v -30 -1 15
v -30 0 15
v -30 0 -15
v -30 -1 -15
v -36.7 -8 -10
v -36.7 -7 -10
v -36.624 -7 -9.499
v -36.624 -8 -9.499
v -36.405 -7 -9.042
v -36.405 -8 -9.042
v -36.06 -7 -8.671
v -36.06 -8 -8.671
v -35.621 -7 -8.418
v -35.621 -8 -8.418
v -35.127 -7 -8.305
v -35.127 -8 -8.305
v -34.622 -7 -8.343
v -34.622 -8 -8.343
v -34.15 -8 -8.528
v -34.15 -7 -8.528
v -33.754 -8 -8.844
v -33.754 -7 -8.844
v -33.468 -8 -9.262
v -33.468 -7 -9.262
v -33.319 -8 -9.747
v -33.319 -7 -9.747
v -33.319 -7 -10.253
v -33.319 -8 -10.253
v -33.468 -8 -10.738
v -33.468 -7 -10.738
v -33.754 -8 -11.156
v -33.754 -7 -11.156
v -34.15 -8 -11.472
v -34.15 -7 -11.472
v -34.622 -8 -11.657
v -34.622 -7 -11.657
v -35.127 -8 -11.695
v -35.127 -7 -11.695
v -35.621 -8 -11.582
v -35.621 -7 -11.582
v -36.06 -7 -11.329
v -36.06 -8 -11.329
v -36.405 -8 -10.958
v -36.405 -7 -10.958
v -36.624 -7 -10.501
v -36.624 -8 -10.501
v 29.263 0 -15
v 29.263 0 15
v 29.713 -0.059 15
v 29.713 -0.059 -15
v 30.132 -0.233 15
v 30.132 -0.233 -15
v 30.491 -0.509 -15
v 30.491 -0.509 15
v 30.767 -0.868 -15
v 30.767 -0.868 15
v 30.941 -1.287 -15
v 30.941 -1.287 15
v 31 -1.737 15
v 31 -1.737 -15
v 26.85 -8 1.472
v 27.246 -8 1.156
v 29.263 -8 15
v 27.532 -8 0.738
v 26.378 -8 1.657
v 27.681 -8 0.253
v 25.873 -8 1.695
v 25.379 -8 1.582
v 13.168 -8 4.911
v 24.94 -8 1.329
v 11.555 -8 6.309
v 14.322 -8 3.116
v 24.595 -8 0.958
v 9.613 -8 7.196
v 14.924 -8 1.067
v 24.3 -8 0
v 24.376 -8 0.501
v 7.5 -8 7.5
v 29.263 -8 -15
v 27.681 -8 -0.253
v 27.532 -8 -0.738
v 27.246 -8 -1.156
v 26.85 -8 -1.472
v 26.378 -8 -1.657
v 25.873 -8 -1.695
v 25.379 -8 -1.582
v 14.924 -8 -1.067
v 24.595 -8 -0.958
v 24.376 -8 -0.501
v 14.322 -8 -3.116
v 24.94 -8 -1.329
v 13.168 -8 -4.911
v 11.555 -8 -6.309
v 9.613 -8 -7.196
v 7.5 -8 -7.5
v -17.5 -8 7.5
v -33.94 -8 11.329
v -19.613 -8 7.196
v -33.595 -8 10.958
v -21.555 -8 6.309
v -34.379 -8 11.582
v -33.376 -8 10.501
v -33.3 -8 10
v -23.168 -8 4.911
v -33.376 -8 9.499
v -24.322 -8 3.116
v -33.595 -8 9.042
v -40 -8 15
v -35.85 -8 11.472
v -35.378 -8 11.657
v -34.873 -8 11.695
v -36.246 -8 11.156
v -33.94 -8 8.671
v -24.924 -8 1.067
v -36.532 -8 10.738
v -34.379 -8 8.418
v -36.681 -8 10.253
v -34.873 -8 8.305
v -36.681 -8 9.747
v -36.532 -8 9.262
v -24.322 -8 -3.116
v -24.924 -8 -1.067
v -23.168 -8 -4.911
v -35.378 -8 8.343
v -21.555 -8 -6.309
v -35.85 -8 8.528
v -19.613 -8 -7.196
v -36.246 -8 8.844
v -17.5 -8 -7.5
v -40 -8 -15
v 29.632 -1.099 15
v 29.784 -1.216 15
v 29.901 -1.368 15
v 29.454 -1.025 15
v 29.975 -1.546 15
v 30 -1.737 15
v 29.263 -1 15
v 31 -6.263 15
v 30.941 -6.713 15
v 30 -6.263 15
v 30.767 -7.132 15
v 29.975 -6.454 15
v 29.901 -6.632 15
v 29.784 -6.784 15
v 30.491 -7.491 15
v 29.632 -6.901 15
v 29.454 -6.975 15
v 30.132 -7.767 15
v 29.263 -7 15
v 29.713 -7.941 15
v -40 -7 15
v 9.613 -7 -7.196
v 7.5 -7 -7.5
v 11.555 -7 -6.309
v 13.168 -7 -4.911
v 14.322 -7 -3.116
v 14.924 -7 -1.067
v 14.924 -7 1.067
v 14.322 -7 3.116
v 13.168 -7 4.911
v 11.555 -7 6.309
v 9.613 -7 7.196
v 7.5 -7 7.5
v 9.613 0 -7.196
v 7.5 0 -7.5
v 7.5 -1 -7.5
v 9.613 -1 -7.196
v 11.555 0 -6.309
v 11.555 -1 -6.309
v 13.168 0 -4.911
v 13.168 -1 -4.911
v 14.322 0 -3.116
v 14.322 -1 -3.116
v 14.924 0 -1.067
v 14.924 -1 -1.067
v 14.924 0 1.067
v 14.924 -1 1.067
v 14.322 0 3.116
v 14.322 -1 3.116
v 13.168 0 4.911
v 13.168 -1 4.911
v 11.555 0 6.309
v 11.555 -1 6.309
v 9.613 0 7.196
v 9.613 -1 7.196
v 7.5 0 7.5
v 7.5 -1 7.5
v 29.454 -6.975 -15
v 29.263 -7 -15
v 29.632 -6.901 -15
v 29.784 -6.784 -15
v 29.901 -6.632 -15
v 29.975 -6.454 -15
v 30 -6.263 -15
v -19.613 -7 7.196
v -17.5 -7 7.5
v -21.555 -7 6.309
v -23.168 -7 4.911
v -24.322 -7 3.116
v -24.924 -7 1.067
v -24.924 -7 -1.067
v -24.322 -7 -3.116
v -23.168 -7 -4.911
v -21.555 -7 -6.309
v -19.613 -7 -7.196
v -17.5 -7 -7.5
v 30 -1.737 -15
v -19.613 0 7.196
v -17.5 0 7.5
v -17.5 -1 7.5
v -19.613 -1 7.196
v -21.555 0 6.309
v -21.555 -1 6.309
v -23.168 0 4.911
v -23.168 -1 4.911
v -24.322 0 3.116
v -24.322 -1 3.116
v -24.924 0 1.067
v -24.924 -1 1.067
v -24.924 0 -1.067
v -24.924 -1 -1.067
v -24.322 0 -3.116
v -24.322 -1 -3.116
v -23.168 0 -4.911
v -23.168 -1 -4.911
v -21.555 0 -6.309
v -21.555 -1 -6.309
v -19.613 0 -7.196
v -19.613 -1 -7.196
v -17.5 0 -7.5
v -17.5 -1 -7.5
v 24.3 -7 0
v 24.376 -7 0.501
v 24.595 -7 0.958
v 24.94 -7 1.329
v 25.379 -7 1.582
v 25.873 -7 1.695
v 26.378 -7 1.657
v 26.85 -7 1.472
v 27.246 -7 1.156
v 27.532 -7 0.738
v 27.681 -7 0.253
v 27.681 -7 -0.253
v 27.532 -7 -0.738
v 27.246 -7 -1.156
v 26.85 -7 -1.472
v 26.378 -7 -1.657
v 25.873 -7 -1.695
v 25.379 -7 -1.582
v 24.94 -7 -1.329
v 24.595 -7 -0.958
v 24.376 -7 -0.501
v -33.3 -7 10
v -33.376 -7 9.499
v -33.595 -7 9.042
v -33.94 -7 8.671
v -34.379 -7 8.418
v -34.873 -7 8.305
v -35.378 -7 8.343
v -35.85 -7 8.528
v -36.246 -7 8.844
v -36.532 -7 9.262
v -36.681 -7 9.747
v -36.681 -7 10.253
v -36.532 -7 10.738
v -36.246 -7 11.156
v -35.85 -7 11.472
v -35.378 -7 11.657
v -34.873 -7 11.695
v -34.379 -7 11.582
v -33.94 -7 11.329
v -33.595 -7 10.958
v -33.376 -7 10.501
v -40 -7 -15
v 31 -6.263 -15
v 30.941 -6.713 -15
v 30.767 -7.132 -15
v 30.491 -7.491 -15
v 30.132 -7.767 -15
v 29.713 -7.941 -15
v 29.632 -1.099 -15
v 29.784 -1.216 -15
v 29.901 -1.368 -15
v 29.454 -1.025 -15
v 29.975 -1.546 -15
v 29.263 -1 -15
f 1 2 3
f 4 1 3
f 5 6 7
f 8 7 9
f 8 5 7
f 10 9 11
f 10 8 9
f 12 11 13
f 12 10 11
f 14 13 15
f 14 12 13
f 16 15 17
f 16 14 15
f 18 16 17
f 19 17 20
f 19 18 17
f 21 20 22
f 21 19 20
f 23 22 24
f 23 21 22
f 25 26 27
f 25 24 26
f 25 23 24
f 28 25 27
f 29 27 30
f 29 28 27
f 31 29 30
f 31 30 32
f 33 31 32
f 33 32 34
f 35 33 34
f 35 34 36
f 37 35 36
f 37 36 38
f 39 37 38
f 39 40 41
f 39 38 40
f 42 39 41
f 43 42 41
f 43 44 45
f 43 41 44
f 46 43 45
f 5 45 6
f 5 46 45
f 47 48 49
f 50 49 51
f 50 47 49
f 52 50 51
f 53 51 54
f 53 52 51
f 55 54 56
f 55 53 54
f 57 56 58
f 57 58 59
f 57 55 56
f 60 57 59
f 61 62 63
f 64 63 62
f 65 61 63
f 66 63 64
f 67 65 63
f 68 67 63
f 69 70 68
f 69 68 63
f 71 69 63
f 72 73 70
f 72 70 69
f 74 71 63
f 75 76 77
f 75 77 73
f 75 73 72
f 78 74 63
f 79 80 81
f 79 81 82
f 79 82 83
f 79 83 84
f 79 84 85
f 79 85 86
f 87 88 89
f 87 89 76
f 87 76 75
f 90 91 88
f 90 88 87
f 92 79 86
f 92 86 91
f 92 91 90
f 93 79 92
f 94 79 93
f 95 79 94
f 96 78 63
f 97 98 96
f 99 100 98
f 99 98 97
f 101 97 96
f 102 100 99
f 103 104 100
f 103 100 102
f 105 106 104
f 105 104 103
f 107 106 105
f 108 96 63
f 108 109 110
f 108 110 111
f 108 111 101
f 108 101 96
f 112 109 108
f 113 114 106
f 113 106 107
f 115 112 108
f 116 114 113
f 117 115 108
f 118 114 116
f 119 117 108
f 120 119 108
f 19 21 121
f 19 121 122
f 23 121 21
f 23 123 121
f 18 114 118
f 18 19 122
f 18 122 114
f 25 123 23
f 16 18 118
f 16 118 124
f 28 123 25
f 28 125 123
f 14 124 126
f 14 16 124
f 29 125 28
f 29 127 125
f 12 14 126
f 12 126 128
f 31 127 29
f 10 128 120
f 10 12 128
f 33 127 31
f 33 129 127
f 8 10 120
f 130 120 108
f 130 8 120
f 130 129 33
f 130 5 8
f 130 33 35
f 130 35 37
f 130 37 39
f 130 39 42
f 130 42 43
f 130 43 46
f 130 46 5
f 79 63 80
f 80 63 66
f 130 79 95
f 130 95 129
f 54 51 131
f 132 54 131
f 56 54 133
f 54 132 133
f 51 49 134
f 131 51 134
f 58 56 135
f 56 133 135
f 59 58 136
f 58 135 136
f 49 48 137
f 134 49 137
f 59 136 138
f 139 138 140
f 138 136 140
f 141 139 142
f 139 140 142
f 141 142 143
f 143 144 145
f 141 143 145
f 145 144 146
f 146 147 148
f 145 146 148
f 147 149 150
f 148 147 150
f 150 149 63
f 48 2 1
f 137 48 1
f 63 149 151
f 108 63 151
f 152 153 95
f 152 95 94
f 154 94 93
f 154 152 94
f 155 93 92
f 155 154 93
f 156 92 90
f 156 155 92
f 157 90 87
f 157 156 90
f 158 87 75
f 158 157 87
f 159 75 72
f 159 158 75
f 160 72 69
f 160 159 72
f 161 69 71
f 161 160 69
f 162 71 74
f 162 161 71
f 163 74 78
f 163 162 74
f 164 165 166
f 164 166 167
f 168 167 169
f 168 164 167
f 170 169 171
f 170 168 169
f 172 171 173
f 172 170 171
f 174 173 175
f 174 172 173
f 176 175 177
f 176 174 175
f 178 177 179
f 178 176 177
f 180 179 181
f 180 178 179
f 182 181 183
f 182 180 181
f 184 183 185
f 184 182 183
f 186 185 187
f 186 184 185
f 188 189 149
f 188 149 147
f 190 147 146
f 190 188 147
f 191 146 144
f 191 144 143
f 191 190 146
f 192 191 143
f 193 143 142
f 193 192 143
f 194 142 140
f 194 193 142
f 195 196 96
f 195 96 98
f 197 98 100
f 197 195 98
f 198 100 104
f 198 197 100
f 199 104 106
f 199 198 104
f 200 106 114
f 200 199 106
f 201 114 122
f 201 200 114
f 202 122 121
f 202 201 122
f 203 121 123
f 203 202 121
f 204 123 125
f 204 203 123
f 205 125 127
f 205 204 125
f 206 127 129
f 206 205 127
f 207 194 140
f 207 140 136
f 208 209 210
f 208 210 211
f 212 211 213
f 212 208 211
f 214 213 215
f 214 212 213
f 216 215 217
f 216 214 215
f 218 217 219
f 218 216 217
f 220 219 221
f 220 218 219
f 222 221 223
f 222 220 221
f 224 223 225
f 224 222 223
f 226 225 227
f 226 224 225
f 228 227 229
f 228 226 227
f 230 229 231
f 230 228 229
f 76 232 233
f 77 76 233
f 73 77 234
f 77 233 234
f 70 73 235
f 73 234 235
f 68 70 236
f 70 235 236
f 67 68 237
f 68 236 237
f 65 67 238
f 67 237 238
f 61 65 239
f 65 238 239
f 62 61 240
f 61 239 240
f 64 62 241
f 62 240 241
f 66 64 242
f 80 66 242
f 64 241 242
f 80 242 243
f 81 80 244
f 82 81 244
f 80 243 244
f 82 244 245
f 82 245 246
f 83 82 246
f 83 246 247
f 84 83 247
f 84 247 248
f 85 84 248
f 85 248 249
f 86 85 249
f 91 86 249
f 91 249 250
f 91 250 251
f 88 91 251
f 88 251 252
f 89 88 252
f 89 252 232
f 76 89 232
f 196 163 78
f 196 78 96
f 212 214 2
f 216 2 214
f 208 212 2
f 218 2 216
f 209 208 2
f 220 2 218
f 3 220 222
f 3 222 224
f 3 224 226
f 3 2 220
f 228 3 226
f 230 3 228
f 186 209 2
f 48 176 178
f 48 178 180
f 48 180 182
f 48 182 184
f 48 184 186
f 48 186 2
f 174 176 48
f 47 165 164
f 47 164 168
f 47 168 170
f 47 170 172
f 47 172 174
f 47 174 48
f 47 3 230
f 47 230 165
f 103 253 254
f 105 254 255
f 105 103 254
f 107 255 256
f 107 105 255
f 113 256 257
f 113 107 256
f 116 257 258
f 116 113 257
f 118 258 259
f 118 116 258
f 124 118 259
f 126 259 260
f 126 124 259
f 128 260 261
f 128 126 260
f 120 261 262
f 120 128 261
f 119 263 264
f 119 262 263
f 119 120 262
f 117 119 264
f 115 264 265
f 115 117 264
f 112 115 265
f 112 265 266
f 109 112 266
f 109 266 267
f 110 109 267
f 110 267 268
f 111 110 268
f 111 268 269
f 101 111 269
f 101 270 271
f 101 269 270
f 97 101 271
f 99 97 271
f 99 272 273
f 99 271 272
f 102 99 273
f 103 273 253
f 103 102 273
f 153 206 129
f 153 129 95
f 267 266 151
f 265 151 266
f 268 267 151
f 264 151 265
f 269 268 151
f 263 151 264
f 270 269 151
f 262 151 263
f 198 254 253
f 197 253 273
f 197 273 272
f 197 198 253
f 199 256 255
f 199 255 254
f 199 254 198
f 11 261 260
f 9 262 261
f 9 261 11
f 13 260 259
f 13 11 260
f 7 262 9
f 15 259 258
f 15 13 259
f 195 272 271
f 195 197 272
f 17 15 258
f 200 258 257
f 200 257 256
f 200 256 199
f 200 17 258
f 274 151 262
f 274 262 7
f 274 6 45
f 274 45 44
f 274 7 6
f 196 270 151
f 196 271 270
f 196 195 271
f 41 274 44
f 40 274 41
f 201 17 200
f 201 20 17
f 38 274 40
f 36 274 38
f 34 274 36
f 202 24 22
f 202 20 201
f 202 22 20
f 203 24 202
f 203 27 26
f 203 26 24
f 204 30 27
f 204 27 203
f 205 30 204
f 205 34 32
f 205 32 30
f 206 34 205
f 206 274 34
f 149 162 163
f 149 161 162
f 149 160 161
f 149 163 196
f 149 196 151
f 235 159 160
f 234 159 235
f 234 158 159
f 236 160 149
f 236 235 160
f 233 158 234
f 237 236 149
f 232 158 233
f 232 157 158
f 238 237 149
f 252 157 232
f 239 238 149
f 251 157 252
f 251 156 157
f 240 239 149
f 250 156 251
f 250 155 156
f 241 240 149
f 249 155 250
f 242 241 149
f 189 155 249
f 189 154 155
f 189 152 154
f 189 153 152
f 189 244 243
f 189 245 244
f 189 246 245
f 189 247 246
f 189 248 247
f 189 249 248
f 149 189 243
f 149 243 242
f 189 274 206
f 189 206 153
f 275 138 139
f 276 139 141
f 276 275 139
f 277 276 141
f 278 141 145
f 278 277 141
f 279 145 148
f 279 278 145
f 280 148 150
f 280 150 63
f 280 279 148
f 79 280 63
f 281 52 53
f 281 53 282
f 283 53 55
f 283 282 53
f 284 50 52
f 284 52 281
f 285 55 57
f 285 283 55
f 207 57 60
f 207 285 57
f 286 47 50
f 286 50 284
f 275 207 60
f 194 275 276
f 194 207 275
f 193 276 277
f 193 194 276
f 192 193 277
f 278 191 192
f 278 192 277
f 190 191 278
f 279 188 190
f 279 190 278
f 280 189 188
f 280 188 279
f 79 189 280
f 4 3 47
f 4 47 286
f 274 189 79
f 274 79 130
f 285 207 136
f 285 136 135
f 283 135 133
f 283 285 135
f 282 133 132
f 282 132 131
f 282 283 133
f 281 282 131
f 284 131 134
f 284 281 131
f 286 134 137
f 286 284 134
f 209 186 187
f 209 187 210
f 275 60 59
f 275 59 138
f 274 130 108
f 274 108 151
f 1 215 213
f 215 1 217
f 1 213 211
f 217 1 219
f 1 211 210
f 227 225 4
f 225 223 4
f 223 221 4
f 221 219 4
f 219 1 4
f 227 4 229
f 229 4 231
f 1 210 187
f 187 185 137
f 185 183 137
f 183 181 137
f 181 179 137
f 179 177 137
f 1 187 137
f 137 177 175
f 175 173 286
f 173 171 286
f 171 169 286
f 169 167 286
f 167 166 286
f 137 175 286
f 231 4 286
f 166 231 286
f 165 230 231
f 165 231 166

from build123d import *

# Parameters (mm, degrees)
ESQUISSE2_W                           = 60
ESQUISSE2_H                           = 30
T_LE_DE_BASE_PLI_E1_DEPTH             = 1
T_LE_PLI_E_SUR_AR_TE1_STRIP_W         = 5.4732
T_LE_PLI_E_SUR_AR_TE1_STRIP_H         = 1
T_LE_PLI_E_SUR_AR_TE1_STRIP_CUT_DEPTH = 30
T_LE_PLI_E_SUR_AR_TE1_DEPTH           = 30
T_LE_PLI_E_SUR_AR_TE2_STRIP_W         = 5.4732
T_LE_PLI_E_SUR_AR_TE2_STRIP_H         = 1
T_LE_PLI_E_SUR_AR_TE2_STRIP_CUT_DEPTH = 30
T_LE_PLI_E_SUR_AR_TE2_DEPTH           = 30
ENL_V_MAT_EXTRU_1_DEPTH               = 44.462627624
ENL_V_MAT_EXTRU_2_REACH               = 45.463
ESQUISSE27_R                          = 1.7
ESQUISSE29_R                          = 1.7
ENL_V_MAT_EXTRU_3_DEPTH               = 44.289721644


# Sheet-metal steps are written as plain solids
with BuildPart() as part:
    # Esquisse2 → Tôle de base pliée1 (new body)
    with BuildSketch(Plane(origin=(0, 0, 0), x_dir=(1, 0, 0), z_dir=(0, 1, 0))):
        Rectangle(ESQUISSE2_W, ESQUISSE2_H)
    extrude(amount=-T_LE_DE_BASE_PLI_E1_DEPTH)

    # Tôle pliée sur arête1 strip (across the edge) → Tôle pliée sur arête1 strip cut (cut)
    with BuildSketch(Plane(origin=(30, -1, -15), x_dir=(-1, 0, 0), z_dir=(0, 0, 1))):
        with Locations((-2, -0.5)):
            Rectangle(T_LE_PLI_E_SUR_AR_TE1_STRIP_W, T_LE_PLI_E_SUR_AR_TE1_STRIP_H)
    extrude(amount=T_LE_PLI_E_SUR_AR_TE1_STRIP_CUT_DEPTH, mode=Mode.SUBTRACT)

    # Tôle pliée sur arête1 section (across the edge) → Tôle pliée sur arête1 (add)
    with BuildSketch(Plane(origin=(30, -1, -15), x_dir=(-1, 0, 0), z_dir=(0, 0, 1))):
        with BuildLine():
            Line((-1, 0.7366), (-1, 6))
            Line((-1, 6), (0, 6))
            Line((0, 6), (0, 0.7366))
            ThreePointArc((0, 0.7366), (0.215745145, 0.215745145), (0.7366, 0))
            Line((0.7366, 0), (0.7366, -1))
            ThreePointArc((0.7366, -1), (-0.491361636, -0.491361636), (-1, 0.7366))
        make_face()
    extrude(amount=T_LE_PLI_E_SUR_AR_TE1_DEPTH)

    # Tôle pliée sur arête2 strip (across the edge) → Tôle pliée sur arête2 strip cut (cut)
    with BuildSketch(Plane(origin=(30, -7, -15), x_dir=(0, 1, 0), z_dir=(0, 0, 1))):
        with Locations((-2, -0.5)):
            Rectangle(T_LE_PLI_E_SUR_AR_TE2_STRIP_W, T_LE_PLI_E_SUR_AR_TE2_STRIP_H)
    extrude(amount=T_LE_PLI_E_SUR_AR_TE2_STRIP_CUT_DEPTH, mode=Mode.SUBTRACT)

    # Tôle pliée sur arête2 section (across the edge) → Tôle pliée sur arête2 (add)
    with BuildSketch(Plane(origin=(30, -7, -15), x_dir=(0, 1, 0), z_dir=(0, 0, 1))):
        with BuildLine():
            Line((-1, 0.7366), (-1, 70))
            Line((-1, 70), (0, 70))
            Line((0, 70), (0, 0.7366))
            ThreePointArc((0, 0.7366), (0.215745145, 0.215745145), (0.7366, 0))
            Line((0.7366, 0), (0.7366, -1))
            ThreePointArc((0.7366, -1), (-0.491361636, -0.491361636), (-1, 0.7366))
        make_face()
    extrude(amount=T_LE_PLI_E_SUR_AR_TE2_DEPTH)

    # Esquisse26 → Enlèv. mat.-Extru.1 (cut, through all)
    with BuildSketch(Plane(origin=(0, 0, 0), x_dir=(1, 0, 0), z_dir=(0, 1, 0))):
        with BuildLine():
            Line((-17.5, 7.5), (7.5, 7.5))
            ThreePointArc((7.5, 7.5), (15, 0), (7.5, -7.5))
            Line((7.5, -7.5), (-17.5, -7.5))
            ThreePointArc((-17.5, -7.5), (-25, 0), (-17.5, 7.5))
        make_face()
    extrude(amount=-ENL_V_MAT_EXTRU_1_DEPTH, mode=Mode.SUBTRACT)

    # Esquisse27 → Enlèv. mat.-Extru.2 (cut, up to next)
    with BuildSketch(Plane(origin=(0, -8, 0), x_dir=(1, 0, 0), z_dir=(0, 1, 0)), mode=Mode.PRIVATE) as enl_v_mat_extru_2_sk1:
        with Locations(Location((-35, 10, 0), (0, 0, 180))):
            Circle(ESQUISSE27_R)
    enl_v_mat_extru_2_tool1 = extrude(enl_v_mat_extru_2_sk1.sketch, amount=ENL_V_MAT_EXTRU_2_REACH, mode=Mode.PRIVATE) & part.part
    # Esquisse27 → Enlèv. mat.-Extru.2 (cut, up to next)
    with BuildSketch(Plane(origin=(0, -8, 0), x_dir=(1, 0, 0), z_dir=(0, 1, 0)), mode=Mode.PRIVATE) as enl_v_mat_extru_2_sk2:
        with Locations((-35, -10)):
            Circle(ESQUISSE27_R)
    enl_v_mat_extru_2_tool2 = extrude(enl_v_mat_extru_2_sk2.sketch, amount=ENL_V_MAT_EXTRU_2_REACH, mode=Mode.PRIVATE) & part.part
    add(enl_v_mat_extru_2_tool1.solids().sort_by_distance((-35, -8, -10))[0], mode=Mode.SUBTRACT)
    add(enl_v_mat_extru_2_tool2.solids().sort_by_distance((-35, -8, 10))[0], mode=Mode.SUBTRACT)

    # Esquisse29 → Enlèv. mat.-Extru.3 (cut, through all)
    with BuildSketch(Plane(origin=(0, -7, 0), x_dir=(1, 0, 0), z_dir=(0, 1, 0))):
        with Locations(Location((26, 0, 0), (0, 0, 180))):
            Circle(ESQUISSE29_R)
    extrude(amount=-ENL_V_MAT_EXTRU_3_DEPTH, mode=Mode.SUBTRACT)


solid = part.part
